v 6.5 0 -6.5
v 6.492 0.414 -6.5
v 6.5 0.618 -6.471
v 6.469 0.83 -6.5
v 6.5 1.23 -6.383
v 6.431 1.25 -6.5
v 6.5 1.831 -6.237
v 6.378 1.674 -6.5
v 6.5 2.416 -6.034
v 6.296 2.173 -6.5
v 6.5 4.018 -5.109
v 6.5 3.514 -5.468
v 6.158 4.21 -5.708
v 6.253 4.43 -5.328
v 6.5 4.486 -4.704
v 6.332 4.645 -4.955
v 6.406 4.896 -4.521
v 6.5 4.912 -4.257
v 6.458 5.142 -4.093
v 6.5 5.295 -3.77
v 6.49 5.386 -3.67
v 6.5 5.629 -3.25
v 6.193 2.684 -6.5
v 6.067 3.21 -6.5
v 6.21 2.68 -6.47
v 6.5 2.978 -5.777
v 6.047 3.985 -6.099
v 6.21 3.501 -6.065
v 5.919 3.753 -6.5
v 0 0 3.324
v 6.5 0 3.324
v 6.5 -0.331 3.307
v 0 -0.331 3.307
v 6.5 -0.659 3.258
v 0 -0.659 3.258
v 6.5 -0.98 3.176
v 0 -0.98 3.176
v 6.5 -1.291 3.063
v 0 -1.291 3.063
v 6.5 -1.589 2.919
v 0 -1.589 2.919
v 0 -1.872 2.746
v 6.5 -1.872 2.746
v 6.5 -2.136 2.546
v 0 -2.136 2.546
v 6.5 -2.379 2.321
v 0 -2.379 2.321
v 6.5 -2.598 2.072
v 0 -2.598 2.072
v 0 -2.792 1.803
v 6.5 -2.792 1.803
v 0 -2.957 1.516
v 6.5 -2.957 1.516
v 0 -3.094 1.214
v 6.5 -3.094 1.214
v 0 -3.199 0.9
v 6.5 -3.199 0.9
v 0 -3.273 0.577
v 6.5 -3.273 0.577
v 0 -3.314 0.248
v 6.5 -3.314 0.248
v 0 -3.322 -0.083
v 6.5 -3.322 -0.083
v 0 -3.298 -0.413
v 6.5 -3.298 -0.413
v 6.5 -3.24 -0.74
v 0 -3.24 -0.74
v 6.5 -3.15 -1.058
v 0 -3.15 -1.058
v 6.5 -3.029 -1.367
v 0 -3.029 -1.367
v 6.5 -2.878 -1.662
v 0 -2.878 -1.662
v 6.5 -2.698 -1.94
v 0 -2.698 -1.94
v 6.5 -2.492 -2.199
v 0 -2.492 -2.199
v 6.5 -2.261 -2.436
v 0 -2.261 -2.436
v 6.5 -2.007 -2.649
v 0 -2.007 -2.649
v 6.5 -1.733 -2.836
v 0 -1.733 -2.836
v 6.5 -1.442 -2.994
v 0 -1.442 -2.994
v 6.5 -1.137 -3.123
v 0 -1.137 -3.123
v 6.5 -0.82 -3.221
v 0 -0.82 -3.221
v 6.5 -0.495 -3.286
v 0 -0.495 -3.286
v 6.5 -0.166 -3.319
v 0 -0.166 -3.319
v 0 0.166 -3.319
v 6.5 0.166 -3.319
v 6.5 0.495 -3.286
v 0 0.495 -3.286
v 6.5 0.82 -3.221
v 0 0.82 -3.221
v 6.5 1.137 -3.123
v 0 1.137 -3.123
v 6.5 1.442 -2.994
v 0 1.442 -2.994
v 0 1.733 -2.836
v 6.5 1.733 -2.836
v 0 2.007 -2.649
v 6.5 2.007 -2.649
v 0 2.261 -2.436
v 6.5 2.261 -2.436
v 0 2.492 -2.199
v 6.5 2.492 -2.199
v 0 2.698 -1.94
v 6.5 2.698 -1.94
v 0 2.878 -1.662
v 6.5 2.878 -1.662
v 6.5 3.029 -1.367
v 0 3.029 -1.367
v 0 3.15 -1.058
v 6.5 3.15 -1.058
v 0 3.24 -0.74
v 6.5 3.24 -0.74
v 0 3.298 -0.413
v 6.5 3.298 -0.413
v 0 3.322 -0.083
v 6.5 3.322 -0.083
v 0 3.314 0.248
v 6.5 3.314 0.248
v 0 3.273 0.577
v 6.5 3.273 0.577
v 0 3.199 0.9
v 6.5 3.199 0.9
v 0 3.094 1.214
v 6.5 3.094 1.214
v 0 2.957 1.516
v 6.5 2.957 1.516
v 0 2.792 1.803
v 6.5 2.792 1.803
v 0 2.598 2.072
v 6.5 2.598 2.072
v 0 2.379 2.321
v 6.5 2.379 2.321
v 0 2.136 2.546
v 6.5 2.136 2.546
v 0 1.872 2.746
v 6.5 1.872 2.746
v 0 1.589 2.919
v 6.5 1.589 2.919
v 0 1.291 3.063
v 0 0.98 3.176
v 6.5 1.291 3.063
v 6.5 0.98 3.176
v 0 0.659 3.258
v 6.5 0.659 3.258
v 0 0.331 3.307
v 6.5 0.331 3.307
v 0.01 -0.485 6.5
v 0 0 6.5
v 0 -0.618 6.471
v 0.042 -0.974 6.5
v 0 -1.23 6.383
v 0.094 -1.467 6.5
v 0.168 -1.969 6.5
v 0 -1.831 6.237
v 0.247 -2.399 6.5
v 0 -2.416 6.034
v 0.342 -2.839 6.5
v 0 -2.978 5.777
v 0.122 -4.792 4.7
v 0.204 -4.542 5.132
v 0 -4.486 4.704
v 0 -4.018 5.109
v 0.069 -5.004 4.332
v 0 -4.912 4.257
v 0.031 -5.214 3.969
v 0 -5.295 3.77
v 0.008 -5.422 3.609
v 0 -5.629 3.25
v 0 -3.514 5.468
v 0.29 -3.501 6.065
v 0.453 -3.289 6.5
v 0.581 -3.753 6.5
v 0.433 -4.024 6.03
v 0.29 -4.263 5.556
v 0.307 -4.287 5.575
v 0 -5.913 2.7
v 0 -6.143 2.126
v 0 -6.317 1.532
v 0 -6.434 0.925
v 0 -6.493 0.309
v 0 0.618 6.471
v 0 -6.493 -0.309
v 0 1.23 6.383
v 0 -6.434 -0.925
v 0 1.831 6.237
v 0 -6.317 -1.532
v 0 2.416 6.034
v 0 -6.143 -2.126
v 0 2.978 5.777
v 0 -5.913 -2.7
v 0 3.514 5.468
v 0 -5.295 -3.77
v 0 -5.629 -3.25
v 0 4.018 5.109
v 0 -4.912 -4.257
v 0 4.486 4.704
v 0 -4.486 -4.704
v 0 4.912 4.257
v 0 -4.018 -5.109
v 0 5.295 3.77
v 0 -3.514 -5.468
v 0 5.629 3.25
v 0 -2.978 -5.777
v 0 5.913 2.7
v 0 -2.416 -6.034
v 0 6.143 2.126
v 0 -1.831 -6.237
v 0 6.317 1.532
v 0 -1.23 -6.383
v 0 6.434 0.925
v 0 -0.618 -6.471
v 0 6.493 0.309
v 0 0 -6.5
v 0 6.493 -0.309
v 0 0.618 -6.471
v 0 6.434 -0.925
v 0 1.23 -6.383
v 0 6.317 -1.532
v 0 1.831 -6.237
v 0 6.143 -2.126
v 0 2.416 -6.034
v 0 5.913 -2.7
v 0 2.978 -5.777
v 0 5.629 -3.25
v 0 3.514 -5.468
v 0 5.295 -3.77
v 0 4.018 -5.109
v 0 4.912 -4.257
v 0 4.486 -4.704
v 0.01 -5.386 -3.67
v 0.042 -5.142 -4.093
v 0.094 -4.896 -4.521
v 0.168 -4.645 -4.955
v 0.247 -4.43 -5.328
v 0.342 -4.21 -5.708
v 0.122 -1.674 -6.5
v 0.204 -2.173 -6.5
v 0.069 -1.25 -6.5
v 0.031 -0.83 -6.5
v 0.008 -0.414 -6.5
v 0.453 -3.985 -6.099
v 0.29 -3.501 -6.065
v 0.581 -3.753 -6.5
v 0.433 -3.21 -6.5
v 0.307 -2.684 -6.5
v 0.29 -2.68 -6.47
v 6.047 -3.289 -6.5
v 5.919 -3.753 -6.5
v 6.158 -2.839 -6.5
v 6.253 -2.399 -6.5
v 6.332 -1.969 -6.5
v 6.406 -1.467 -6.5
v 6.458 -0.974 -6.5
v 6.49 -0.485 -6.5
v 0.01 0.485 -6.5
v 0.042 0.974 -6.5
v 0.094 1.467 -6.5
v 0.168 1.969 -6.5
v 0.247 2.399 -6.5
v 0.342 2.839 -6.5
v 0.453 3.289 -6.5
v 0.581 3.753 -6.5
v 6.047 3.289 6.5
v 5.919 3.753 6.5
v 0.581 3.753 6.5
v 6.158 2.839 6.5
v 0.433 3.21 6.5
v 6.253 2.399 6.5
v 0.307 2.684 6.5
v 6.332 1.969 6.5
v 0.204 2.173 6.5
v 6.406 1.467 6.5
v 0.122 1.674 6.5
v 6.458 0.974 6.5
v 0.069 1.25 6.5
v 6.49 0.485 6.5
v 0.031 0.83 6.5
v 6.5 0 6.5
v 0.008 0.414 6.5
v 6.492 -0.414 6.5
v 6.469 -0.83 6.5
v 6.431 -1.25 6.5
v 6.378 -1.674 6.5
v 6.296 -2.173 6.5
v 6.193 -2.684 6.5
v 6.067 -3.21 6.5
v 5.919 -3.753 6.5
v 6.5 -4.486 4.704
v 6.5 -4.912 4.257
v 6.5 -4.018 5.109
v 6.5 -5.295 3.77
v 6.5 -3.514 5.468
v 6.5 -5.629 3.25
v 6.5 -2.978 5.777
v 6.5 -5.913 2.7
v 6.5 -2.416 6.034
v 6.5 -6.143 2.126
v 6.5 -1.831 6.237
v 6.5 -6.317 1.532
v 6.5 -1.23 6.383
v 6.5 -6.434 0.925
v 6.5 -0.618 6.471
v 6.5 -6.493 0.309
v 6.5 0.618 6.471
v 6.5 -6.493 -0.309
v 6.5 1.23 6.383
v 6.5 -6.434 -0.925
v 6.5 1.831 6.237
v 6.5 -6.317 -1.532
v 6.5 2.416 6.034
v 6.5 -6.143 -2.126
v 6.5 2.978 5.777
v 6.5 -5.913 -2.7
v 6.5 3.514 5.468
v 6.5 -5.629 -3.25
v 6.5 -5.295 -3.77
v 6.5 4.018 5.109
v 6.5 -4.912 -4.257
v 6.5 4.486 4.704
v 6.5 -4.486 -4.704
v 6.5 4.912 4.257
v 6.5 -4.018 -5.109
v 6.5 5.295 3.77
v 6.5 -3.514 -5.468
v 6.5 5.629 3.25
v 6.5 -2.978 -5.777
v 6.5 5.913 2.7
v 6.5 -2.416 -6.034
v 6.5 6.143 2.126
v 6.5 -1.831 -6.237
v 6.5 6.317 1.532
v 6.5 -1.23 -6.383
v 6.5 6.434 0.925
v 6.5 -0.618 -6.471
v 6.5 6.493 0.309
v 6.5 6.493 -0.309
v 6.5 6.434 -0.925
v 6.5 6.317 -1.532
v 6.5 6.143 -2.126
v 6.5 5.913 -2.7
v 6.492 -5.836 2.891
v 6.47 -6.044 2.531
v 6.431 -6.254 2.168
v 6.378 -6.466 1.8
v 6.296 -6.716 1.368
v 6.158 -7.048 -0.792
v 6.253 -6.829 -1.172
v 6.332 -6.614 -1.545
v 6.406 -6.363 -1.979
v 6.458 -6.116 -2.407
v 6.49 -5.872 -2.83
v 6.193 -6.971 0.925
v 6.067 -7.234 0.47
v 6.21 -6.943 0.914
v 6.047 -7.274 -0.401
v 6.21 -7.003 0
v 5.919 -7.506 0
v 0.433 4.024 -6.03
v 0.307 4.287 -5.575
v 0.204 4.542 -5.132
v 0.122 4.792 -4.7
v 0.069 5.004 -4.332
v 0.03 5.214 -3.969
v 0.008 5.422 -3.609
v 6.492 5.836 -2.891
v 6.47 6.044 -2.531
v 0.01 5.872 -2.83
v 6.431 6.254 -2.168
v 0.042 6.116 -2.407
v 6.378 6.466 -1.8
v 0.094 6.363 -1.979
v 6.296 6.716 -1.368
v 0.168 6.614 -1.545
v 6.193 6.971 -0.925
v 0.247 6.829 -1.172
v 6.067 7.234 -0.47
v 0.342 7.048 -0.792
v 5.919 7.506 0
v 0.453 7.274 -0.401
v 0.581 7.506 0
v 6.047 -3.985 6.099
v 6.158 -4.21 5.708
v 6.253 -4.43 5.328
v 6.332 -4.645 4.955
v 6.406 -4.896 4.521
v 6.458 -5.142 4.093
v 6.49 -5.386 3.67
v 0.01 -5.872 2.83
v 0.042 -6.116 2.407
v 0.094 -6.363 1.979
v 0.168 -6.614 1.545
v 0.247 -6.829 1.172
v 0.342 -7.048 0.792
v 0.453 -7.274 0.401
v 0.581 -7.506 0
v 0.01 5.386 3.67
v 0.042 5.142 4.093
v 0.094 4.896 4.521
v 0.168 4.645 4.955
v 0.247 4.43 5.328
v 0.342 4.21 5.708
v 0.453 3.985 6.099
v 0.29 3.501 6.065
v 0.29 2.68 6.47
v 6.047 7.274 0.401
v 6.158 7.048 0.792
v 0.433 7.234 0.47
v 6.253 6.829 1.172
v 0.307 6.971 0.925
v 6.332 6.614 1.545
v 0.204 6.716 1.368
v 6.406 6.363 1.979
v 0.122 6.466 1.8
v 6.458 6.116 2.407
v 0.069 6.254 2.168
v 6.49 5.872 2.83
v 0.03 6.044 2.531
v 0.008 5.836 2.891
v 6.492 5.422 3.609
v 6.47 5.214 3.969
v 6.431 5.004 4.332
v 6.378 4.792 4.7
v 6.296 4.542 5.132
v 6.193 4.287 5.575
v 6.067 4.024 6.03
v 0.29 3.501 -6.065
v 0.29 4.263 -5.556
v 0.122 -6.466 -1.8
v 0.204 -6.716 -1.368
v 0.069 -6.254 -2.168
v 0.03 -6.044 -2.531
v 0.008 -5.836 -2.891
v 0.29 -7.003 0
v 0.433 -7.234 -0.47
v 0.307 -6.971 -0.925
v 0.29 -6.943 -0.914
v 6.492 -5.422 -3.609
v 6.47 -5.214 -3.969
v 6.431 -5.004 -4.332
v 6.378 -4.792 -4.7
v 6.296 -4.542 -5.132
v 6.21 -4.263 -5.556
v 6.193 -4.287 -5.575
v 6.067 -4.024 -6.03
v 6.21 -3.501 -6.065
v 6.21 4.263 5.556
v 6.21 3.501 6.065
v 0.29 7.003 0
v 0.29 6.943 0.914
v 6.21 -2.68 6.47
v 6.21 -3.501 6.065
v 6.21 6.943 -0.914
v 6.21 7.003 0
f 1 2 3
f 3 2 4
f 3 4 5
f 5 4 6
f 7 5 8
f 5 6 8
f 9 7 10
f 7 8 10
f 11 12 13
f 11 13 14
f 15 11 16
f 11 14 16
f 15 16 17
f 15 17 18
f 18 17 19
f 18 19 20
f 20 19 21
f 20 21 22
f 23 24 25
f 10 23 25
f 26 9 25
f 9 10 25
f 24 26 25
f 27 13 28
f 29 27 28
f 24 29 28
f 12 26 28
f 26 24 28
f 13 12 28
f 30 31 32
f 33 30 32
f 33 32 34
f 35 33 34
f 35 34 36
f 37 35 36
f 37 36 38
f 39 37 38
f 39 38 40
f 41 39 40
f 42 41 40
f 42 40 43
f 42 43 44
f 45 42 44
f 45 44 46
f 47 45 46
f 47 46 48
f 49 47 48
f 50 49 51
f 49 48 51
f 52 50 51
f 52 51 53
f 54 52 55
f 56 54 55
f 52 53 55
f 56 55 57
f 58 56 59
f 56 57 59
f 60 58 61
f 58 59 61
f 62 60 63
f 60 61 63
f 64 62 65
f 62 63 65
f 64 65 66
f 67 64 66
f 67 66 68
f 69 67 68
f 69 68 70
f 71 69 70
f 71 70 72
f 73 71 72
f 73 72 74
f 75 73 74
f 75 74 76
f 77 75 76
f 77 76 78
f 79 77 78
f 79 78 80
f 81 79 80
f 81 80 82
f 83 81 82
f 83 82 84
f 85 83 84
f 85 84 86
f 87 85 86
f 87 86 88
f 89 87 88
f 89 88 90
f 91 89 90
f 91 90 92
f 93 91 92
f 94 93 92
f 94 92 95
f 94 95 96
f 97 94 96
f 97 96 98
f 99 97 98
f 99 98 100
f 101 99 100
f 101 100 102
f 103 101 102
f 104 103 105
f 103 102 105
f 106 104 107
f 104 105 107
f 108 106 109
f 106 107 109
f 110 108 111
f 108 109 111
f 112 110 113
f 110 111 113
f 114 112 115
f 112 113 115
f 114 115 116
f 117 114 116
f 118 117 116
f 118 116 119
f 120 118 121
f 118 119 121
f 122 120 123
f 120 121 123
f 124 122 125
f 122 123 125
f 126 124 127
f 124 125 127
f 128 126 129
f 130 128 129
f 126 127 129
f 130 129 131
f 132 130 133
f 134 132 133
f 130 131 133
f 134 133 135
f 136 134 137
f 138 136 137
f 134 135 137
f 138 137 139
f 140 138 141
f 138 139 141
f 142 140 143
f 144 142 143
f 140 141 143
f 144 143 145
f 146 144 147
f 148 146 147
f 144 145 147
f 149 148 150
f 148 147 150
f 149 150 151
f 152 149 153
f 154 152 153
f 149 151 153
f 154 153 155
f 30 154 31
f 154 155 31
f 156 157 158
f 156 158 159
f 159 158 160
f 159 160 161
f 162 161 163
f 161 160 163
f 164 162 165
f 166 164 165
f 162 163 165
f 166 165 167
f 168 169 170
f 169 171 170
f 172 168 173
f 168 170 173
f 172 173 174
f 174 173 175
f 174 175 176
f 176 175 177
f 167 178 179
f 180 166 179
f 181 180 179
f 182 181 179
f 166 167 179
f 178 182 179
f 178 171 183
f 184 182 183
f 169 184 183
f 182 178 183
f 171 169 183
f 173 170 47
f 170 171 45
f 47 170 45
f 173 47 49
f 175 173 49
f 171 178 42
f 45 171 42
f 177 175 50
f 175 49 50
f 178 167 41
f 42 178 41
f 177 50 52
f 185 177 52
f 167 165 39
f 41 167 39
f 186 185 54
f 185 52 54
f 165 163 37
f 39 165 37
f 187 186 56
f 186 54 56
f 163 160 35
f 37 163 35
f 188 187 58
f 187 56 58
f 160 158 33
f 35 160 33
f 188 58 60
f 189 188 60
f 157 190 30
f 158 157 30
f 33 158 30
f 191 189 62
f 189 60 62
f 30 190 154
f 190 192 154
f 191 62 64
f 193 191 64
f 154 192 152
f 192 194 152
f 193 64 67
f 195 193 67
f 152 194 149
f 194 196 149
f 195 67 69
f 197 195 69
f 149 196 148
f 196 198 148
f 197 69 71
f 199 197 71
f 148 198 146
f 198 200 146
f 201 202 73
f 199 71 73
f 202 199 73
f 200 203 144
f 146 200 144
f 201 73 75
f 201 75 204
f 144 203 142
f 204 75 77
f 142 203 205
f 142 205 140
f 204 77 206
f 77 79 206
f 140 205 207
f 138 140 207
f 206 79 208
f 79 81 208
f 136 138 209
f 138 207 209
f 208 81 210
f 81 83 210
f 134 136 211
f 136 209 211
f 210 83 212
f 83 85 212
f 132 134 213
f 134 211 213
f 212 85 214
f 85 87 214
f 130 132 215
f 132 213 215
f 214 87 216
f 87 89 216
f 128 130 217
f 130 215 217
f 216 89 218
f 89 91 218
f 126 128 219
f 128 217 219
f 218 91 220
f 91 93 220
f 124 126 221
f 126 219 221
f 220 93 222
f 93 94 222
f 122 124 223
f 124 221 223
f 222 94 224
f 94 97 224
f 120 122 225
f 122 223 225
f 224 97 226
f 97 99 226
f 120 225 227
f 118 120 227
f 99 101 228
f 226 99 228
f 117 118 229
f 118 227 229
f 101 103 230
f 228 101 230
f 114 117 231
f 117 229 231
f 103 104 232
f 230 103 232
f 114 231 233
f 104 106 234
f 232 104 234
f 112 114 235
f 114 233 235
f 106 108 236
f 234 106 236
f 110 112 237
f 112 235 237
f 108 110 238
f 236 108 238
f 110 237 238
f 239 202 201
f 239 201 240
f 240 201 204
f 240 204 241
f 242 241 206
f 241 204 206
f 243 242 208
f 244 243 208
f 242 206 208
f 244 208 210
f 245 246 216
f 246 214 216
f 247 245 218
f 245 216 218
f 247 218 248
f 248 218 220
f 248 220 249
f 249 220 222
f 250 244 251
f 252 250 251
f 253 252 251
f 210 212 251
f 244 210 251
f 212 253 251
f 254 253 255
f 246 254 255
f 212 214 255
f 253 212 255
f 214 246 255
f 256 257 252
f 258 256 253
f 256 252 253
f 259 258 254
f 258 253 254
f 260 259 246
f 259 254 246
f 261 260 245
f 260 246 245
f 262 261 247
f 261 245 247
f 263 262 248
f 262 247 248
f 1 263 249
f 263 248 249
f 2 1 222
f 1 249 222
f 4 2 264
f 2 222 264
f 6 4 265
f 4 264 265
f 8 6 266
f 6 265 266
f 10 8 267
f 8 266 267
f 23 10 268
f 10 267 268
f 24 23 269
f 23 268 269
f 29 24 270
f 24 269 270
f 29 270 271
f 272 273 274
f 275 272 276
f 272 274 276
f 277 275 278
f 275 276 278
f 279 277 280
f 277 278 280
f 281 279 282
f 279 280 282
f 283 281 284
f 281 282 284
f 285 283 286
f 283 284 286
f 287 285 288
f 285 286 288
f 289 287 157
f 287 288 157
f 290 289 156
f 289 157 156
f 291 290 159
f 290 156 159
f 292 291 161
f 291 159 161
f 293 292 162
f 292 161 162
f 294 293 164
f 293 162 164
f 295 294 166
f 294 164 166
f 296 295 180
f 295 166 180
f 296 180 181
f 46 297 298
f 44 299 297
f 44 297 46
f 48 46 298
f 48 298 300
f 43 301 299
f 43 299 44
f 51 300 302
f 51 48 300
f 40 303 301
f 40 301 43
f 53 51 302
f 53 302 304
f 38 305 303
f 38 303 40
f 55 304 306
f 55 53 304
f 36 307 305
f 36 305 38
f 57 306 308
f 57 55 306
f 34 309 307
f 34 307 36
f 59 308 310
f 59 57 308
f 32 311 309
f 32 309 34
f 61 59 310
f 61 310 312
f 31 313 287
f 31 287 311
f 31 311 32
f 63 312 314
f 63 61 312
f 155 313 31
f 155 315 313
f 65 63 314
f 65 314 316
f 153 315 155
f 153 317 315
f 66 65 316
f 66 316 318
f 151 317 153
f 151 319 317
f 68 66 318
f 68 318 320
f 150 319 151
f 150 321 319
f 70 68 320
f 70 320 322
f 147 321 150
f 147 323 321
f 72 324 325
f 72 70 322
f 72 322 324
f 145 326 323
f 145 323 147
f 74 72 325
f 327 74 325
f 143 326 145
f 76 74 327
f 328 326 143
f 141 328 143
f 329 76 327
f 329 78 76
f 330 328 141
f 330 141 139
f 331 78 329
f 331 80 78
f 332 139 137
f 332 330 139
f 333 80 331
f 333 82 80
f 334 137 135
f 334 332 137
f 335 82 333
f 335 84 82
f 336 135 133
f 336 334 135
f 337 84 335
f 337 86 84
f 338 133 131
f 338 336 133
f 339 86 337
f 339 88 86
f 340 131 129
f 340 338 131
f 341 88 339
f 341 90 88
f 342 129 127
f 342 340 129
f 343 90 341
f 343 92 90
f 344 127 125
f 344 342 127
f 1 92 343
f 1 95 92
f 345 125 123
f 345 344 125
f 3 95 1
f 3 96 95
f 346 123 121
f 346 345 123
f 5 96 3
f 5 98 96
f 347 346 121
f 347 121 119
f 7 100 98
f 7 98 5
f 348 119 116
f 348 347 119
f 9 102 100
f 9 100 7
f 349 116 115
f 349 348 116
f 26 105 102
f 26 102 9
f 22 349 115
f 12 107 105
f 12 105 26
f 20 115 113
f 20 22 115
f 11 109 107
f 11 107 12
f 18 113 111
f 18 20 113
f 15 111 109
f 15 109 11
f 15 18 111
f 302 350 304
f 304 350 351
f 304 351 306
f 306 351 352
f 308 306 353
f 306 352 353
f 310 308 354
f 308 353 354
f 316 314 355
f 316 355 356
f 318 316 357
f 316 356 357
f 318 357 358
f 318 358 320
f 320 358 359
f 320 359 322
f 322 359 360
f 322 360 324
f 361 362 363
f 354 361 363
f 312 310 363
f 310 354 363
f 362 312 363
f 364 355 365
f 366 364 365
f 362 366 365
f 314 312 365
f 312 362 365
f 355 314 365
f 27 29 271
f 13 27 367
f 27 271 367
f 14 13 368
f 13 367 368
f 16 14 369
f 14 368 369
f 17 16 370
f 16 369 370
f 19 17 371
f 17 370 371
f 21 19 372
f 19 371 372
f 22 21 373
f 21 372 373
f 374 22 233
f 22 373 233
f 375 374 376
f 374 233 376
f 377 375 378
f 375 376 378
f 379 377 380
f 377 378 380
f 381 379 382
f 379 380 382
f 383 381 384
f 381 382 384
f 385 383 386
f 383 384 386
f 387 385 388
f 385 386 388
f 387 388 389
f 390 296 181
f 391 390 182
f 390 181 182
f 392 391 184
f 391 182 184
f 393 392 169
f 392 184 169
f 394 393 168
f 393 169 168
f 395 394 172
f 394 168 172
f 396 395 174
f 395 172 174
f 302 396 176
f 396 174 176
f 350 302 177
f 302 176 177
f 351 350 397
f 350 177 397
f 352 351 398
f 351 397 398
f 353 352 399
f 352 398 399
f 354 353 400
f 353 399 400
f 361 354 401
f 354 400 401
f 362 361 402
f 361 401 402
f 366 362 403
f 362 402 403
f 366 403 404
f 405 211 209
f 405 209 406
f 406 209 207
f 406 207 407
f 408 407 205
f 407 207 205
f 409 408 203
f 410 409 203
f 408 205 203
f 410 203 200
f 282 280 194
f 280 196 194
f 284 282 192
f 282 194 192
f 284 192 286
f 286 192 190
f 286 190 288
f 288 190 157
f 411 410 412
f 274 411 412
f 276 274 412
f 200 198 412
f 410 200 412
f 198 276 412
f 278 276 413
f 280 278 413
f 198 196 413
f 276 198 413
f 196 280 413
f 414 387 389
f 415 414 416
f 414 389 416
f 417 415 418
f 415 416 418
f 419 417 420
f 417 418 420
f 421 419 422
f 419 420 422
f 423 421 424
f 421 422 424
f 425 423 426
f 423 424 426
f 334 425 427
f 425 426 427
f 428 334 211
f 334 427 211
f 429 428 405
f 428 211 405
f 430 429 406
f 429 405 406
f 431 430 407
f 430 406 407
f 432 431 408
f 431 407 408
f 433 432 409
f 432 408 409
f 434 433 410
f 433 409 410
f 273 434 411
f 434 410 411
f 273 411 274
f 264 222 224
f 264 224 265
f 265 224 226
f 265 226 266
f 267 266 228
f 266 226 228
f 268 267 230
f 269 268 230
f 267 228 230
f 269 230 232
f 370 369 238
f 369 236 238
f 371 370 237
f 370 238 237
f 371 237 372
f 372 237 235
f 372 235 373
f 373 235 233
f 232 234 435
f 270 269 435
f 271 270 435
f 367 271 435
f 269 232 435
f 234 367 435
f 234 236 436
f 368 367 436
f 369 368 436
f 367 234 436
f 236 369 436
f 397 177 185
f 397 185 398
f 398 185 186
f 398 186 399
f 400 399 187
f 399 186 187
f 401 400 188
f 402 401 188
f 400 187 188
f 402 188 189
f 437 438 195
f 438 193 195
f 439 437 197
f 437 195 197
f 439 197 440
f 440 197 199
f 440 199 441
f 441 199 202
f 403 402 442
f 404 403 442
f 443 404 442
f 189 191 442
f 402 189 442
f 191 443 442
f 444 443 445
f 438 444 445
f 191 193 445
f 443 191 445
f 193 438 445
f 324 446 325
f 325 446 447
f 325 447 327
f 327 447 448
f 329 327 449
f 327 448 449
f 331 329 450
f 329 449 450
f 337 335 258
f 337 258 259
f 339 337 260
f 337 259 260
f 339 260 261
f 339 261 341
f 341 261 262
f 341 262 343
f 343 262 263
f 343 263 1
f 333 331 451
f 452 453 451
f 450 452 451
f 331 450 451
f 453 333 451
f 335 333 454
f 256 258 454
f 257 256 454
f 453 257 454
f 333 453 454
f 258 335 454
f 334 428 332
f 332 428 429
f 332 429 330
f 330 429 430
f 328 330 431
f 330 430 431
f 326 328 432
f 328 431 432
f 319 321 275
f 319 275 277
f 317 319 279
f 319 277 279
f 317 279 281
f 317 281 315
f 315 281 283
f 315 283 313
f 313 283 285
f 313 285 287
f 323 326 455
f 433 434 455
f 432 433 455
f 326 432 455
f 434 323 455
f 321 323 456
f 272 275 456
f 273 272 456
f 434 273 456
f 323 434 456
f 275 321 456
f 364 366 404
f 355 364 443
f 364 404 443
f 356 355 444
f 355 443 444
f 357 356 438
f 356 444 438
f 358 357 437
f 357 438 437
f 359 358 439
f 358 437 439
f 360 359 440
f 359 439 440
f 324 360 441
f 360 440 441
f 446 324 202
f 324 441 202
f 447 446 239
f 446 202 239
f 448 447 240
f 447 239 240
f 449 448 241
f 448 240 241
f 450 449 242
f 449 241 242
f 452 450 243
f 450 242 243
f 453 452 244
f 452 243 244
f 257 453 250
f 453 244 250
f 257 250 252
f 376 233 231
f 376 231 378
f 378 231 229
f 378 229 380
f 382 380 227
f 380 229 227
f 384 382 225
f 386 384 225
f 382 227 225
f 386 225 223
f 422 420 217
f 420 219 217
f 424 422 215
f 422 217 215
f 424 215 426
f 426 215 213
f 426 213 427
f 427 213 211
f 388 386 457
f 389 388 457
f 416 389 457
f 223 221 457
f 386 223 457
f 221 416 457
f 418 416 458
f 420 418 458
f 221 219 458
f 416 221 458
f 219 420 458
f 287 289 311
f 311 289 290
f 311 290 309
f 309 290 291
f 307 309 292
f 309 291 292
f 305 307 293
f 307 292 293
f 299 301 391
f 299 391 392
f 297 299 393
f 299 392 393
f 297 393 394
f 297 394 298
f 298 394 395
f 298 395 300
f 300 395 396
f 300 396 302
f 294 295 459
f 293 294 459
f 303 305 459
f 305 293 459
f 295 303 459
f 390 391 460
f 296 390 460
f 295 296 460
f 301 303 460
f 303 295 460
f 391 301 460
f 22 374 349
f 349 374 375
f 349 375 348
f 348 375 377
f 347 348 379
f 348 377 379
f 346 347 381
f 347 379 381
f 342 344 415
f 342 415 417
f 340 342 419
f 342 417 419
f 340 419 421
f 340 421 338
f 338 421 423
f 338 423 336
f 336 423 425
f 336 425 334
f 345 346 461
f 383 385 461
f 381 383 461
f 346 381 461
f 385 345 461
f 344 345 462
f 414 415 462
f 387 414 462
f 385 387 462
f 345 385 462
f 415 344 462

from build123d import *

# Parameters (mm, degrees)
BOSS_EXTRUDE1_DEPTH = 6.5
TAP1_D              = 6.647


with BuildPart() as part:
    # Sketch1 → Boss-Extrude1 (new body)
    with BuildSketch(Plane(origin=(0, 0, 0), x_dir=(0, 0, -1), z_dir=(1, 0, 0))):
        Polygon((6.5, -3.75277675), (6.5, 3.75277675), (0, 7.505553499), (-6.5, 3.75277675), (-6.5, -3.75277675), (0, -7.505553499), align=None)
    extrude(amount=BOSS_EXTRUDE1_DEPTH)

    # Sketch2 → Cut-Revolve1 (revolve, cut)
    with BuildSketch(Plane.XY):
        Polygon((6.5, 7.505553499), (6.5, 6.5), (5.919443416, 7.505553499), align=None)
        Polygon((0, 7.505553499), (0.580556584, 7.505553499), (0, 6.5), align=None)
    revolve(axis=Axis((-0.325, 0, 0), (1, 0, 0)), mode=Mode.SUBTRACT)

    # Tap1 (through all)
    with Locations(Plane(origin=(0, 0, 0), x_dir=(0, 0, -1), z_dir=(-1, 0, 0))):
        with Locations((0, 0)):
            Hole(TAP1_D / 2)


solid = part.part
